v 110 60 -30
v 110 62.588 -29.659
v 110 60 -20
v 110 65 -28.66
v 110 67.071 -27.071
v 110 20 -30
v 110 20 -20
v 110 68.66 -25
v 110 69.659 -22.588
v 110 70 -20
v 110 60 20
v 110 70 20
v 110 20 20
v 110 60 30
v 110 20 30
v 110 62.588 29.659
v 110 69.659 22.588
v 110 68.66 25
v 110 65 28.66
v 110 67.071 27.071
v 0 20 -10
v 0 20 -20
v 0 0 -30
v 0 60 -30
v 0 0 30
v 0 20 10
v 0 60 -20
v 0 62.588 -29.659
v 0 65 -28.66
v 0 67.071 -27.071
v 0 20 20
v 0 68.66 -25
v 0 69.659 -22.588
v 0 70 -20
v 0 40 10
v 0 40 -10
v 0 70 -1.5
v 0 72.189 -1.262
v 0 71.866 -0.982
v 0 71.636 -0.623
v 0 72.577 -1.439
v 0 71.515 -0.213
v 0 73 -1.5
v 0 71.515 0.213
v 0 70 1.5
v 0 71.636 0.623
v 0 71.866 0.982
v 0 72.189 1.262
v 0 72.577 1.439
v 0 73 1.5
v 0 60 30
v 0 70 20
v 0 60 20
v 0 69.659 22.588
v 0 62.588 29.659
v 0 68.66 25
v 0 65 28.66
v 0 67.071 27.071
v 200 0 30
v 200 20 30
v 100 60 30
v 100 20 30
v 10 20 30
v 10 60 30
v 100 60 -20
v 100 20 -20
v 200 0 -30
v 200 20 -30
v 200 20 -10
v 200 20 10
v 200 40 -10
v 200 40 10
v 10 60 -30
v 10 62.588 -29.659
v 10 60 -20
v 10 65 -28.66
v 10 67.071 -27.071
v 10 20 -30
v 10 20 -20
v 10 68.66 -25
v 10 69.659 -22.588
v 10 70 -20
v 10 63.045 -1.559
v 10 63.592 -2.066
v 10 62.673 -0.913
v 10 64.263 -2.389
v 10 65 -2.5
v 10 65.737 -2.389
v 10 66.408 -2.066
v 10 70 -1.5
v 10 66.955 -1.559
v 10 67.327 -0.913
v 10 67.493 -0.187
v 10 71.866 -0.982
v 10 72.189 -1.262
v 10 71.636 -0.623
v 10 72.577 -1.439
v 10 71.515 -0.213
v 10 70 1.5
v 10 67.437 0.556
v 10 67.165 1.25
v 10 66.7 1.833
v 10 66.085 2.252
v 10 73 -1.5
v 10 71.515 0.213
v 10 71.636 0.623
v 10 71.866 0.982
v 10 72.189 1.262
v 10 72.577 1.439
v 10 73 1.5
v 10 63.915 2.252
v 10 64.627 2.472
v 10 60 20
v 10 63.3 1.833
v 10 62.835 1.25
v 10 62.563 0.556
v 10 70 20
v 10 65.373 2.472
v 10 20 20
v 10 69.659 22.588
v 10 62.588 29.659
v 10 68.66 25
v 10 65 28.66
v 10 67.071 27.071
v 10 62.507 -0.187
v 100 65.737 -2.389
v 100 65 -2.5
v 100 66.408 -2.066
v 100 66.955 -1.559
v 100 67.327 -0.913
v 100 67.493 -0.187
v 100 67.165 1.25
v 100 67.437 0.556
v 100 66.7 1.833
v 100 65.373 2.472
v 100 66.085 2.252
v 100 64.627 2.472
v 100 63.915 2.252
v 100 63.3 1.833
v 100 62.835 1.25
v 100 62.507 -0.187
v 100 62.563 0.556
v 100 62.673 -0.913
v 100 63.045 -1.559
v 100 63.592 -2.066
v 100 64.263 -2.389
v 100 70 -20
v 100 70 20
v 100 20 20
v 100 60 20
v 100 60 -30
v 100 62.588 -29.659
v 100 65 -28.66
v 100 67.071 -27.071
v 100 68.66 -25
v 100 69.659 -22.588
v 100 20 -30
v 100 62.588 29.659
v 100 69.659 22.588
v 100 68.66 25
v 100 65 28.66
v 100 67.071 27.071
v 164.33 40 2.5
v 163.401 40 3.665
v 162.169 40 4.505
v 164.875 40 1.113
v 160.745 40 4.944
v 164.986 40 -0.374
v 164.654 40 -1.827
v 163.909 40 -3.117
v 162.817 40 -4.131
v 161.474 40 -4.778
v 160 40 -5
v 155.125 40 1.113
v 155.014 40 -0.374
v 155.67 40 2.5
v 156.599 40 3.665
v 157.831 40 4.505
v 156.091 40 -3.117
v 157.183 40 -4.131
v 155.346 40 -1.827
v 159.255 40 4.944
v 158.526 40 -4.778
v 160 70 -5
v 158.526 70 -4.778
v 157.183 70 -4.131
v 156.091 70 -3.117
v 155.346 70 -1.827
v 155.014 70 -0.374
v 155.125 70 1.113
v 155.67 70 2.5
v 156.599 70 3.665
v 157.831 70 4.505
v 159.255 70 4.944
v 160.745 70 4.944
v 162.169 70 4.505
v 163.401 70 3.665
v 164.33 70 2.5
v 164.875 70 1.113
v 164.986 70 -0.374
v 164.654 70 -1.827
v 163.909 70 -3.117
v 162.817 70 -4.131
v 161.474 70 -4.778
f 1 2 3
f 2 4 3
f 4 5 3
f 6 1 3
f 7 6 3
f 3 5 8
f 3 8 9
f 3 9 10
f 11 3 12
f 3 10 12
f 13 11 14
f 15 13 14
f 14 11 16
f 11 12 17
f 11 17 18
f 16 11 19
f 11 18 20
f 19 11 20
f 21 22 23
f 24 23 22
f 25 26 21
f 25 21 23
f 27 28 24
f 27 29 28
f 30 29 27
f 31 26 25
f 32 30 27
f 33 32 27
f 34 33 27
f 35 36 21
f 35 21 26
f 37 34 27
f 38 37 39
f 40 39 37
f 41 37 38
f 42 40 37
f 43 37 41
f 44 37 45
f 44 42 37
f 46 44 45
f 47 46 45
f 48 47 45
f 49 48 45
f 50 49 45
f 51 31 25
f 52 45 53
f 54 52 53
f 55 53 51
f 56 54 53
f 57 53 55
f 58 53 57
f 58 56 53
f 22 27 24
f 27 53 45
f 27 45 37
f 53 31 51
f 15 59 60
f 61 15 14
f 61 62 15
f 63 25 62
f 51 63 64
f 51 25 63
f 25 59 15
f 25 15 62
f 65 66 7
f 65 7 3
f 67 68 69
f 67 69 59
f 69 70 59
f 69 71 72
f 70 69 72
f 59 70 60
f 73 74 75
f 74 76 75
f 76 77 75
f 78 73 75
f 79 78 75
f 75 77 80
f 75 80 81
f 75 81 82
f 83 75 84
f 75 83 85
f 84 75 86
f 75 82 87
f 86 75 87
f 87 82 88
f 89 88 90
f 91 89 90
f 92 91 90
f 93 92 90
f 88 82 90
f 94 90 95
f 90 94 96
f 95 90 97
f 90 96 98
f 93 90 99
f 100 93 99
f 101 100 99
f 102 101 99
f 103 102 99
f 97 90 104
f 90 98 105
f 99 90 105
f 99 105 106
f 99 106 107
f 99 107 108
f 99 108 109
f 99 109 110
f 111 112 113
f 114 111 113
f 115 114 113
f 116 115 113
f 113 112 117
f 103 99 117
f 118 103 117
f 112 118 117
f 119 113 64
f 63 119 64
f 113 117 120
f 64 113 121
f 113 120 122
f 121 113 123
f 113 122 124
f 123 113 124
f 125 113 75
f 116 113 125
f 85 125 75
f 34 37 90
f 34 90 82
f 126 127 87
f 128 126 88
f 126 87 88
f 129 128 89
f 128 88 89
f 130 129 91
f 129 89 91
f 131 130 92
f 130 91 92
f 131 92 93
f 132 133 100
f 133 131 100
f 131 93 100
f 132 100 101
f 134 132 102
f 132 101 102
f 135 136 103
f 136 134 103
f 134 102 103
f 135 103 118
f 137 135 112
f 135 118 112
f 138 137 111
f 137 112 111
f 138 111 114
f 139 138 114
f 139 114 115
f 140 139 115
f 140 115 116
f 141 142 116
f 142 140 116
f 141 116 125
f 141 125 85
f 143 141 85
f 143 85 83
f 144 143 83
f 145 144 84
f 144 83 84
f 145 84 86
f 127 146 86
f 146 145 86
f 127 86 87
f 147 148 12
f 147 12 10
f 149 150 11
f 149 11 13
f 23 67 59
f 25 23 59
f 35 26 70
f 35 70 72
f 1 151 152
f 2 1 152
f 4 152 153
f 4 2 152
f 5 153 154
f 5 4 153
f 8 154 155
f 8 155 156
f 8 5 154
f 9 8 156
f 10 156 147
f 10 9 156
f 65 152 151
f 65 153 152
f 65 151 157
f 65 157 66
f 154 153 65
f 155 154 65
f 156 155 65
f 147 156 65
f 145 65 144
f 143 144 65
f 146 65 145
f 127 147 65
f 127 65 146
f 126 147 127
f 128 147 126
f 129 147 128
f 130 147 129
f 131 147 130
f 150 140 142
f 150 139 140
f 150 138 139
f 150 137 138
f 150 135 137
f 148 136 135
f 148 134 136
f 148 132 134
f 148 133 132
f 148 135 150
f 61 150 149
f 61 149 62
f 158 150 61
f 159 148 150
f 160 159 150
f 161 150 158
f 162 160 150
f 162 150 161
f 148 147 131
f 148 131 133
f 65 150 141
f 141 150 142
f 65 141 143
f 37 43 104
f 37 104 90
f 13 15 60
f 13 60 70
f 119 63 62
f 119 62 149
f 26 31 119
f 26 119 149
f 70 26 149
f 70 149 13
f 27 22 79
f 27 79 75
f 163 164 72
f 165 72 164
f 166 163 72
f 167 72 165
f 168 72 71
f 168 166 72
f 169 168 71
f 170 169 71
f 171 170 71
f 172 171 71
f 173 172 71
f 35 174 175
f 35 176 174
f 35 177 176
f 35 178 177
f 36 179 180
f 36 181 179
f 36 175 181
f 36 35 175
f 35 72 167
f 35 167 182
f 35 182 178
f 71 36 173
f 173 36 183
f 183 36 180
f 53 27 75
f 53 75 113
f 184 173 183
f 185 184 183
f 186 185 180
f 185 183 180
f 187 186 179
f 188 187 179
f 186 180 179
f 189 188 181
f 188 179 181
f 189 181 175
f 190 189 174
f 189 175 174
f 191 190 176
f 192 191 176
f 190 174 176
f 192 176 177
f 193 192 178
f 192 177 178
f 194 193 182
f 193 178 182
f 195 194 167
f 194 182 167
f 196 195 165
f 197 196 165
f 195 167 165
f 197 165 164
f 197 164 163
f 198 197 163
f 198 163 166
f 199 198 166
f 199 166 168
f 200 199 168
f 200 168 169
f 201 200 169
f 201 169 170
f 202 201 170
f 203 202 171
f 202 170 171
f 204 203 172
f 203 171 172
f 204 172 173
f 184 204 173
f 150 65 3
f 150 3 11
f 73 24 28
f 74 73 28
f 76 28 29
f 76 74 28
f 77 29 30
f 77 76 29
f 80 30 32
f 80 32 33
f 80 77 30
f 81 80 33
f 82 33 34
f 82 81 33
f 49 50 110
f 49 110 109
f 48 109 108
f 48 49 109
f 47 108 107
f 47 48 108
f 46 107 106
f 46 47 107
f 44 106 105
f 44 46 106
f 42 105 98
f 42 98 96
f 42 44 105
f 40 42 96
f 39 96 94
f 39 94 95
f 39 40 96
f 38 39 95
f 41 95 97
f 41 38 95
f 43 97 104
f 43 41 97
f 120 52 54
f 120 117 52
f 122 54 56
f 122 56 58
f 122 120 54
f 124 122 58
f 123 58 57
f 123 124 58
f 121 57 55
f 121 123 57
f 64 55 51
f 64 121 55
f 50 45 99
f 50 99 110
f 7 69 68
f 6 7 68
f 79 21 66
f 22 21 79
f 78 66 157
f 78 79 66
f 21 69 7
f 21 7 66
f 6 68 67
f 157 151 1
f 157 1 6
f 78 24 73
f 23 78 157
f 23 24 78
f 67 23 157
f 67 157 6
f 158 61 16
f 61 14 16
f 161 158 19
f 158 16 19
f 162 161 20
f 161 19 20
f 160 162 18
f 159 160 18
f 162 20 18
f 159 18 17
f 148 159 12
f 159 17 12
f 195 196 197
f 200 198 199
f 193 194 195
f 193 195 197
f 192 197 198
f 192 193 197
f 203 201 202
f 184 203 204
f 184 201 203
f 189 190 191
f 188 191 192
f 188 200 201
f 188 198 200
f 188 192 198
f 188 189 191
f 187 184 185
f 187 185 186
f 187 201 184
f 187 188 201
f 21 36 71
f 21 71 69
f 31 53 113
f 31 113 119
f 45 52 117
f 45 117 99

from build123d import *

# Parameters (mm, degrees)
EXTRUDE_1_DEPTH = 200
EXTRUDE_2_DEPTH = 10
EXTRUDE_3_DEPTH = 10
FILLET_1_R      = 10
EXTRUDE_4_REACH = 206.695
SKETCH_4_R      = 2.5
SKETCH_5_R      = 5
EXTRUDE_5_DEPTH = 30
EXTRUDE_6_DEPTH = 10


with BuildPart() as part:
    # 스케치1 → 보스-돌출1 (new body)
    with BuildSketch(Plane(origin=(0, 0, 0), x_dir=(0, 0, -1), z_dir=(1, 0, 0))):
        Polygon((30, 0), (-30, 0), (-30, 20), (-10, 20), (-10, 40), (10, 40), (10, 20), (30, 20), align=None)
    extrude(amount=EXTRUDE_1_DEPTH)

    # 스케치2 → 보스-돌출2 (add)
    with BuildSketch(Plane.ZY):
        Polygon((-30, 20), (-20, 20), (-20, 60), (20, 60), (20, 20), (30, 20), (30, 70), (-30, 70), align=None)
    extrude(amount=-EXTRUDE_2_DEPTH)

    # 스케치3 → 보스-돌출3 (add)
    with BuildSketch(Plane.ZY.offset(-100)):
        Polygon((20, 20), (30, 20), (30, 70), (-30, 70), (-30, 20), (-20, 20), (-20, 60), (20, 60), align=None)
    extrude(amount=-EXTRUDE_3_DEPTH)

    # 필렛1
    fillet_1_edges = [part.edges().sort_by_distance(p)[0] for p in [
        (5, 70, -30),
        (5, 70, 30),
        (105, 70, -30),
        (105, 70, 30),
    ]]
    fillet(fillet_1_edges, radius=FILLET_1_R)

    # 스케치4 → 보스-돌출4 (add, up to next)
    with BuildSketch(Plane(origin=(10, 0, 0), x_dir=(0, 0, -1), z_dir=(1, 0, 0)), mode=Mode.PRIVATE) as extrude_4_sk1:
        with Locations((0, 65)):
            Circle(SKETCH_4_R)
    extrude_4_tool1 = extrude(extrude_4_sk1.sketch, amount=EXTRUDE_4_REACH, mode=Mode.PRIVATE) - part.part
    add(extrude_4_tool1.solids().sort_by_distance((10, 65, 0))[0])

    # 스케치5 → 보스-돌출5 (add)
    with BuildSketch(Plane(origin=(0, 40, 0), x_dir=(1, 0, 0), z_dir=(0, 1, 0))):
        with Locations(Location((160, 0, 0), (0, 0, 90))):
            Circle(SKETCH_5_R)
    extrude(amount=EXTRUDE_5_DEPTH)

    # 스케치6 → 보스-돌출6 (add)
    with BuildSketch(Plane.ZY):
        with BuildLine():
            Line((-1.5, 73), (-1.5, 70))
            Line((-1.5, 70), (1.5, 70))
            Line((1.5, 70), (1.5, 73))
            ThreePointArc((1.5, 73), (0, 71.5), (-1.5, 73))
        make_face()
    extrude(amount=-EXTRUDE_6_DEPTH)


solid = part.part
